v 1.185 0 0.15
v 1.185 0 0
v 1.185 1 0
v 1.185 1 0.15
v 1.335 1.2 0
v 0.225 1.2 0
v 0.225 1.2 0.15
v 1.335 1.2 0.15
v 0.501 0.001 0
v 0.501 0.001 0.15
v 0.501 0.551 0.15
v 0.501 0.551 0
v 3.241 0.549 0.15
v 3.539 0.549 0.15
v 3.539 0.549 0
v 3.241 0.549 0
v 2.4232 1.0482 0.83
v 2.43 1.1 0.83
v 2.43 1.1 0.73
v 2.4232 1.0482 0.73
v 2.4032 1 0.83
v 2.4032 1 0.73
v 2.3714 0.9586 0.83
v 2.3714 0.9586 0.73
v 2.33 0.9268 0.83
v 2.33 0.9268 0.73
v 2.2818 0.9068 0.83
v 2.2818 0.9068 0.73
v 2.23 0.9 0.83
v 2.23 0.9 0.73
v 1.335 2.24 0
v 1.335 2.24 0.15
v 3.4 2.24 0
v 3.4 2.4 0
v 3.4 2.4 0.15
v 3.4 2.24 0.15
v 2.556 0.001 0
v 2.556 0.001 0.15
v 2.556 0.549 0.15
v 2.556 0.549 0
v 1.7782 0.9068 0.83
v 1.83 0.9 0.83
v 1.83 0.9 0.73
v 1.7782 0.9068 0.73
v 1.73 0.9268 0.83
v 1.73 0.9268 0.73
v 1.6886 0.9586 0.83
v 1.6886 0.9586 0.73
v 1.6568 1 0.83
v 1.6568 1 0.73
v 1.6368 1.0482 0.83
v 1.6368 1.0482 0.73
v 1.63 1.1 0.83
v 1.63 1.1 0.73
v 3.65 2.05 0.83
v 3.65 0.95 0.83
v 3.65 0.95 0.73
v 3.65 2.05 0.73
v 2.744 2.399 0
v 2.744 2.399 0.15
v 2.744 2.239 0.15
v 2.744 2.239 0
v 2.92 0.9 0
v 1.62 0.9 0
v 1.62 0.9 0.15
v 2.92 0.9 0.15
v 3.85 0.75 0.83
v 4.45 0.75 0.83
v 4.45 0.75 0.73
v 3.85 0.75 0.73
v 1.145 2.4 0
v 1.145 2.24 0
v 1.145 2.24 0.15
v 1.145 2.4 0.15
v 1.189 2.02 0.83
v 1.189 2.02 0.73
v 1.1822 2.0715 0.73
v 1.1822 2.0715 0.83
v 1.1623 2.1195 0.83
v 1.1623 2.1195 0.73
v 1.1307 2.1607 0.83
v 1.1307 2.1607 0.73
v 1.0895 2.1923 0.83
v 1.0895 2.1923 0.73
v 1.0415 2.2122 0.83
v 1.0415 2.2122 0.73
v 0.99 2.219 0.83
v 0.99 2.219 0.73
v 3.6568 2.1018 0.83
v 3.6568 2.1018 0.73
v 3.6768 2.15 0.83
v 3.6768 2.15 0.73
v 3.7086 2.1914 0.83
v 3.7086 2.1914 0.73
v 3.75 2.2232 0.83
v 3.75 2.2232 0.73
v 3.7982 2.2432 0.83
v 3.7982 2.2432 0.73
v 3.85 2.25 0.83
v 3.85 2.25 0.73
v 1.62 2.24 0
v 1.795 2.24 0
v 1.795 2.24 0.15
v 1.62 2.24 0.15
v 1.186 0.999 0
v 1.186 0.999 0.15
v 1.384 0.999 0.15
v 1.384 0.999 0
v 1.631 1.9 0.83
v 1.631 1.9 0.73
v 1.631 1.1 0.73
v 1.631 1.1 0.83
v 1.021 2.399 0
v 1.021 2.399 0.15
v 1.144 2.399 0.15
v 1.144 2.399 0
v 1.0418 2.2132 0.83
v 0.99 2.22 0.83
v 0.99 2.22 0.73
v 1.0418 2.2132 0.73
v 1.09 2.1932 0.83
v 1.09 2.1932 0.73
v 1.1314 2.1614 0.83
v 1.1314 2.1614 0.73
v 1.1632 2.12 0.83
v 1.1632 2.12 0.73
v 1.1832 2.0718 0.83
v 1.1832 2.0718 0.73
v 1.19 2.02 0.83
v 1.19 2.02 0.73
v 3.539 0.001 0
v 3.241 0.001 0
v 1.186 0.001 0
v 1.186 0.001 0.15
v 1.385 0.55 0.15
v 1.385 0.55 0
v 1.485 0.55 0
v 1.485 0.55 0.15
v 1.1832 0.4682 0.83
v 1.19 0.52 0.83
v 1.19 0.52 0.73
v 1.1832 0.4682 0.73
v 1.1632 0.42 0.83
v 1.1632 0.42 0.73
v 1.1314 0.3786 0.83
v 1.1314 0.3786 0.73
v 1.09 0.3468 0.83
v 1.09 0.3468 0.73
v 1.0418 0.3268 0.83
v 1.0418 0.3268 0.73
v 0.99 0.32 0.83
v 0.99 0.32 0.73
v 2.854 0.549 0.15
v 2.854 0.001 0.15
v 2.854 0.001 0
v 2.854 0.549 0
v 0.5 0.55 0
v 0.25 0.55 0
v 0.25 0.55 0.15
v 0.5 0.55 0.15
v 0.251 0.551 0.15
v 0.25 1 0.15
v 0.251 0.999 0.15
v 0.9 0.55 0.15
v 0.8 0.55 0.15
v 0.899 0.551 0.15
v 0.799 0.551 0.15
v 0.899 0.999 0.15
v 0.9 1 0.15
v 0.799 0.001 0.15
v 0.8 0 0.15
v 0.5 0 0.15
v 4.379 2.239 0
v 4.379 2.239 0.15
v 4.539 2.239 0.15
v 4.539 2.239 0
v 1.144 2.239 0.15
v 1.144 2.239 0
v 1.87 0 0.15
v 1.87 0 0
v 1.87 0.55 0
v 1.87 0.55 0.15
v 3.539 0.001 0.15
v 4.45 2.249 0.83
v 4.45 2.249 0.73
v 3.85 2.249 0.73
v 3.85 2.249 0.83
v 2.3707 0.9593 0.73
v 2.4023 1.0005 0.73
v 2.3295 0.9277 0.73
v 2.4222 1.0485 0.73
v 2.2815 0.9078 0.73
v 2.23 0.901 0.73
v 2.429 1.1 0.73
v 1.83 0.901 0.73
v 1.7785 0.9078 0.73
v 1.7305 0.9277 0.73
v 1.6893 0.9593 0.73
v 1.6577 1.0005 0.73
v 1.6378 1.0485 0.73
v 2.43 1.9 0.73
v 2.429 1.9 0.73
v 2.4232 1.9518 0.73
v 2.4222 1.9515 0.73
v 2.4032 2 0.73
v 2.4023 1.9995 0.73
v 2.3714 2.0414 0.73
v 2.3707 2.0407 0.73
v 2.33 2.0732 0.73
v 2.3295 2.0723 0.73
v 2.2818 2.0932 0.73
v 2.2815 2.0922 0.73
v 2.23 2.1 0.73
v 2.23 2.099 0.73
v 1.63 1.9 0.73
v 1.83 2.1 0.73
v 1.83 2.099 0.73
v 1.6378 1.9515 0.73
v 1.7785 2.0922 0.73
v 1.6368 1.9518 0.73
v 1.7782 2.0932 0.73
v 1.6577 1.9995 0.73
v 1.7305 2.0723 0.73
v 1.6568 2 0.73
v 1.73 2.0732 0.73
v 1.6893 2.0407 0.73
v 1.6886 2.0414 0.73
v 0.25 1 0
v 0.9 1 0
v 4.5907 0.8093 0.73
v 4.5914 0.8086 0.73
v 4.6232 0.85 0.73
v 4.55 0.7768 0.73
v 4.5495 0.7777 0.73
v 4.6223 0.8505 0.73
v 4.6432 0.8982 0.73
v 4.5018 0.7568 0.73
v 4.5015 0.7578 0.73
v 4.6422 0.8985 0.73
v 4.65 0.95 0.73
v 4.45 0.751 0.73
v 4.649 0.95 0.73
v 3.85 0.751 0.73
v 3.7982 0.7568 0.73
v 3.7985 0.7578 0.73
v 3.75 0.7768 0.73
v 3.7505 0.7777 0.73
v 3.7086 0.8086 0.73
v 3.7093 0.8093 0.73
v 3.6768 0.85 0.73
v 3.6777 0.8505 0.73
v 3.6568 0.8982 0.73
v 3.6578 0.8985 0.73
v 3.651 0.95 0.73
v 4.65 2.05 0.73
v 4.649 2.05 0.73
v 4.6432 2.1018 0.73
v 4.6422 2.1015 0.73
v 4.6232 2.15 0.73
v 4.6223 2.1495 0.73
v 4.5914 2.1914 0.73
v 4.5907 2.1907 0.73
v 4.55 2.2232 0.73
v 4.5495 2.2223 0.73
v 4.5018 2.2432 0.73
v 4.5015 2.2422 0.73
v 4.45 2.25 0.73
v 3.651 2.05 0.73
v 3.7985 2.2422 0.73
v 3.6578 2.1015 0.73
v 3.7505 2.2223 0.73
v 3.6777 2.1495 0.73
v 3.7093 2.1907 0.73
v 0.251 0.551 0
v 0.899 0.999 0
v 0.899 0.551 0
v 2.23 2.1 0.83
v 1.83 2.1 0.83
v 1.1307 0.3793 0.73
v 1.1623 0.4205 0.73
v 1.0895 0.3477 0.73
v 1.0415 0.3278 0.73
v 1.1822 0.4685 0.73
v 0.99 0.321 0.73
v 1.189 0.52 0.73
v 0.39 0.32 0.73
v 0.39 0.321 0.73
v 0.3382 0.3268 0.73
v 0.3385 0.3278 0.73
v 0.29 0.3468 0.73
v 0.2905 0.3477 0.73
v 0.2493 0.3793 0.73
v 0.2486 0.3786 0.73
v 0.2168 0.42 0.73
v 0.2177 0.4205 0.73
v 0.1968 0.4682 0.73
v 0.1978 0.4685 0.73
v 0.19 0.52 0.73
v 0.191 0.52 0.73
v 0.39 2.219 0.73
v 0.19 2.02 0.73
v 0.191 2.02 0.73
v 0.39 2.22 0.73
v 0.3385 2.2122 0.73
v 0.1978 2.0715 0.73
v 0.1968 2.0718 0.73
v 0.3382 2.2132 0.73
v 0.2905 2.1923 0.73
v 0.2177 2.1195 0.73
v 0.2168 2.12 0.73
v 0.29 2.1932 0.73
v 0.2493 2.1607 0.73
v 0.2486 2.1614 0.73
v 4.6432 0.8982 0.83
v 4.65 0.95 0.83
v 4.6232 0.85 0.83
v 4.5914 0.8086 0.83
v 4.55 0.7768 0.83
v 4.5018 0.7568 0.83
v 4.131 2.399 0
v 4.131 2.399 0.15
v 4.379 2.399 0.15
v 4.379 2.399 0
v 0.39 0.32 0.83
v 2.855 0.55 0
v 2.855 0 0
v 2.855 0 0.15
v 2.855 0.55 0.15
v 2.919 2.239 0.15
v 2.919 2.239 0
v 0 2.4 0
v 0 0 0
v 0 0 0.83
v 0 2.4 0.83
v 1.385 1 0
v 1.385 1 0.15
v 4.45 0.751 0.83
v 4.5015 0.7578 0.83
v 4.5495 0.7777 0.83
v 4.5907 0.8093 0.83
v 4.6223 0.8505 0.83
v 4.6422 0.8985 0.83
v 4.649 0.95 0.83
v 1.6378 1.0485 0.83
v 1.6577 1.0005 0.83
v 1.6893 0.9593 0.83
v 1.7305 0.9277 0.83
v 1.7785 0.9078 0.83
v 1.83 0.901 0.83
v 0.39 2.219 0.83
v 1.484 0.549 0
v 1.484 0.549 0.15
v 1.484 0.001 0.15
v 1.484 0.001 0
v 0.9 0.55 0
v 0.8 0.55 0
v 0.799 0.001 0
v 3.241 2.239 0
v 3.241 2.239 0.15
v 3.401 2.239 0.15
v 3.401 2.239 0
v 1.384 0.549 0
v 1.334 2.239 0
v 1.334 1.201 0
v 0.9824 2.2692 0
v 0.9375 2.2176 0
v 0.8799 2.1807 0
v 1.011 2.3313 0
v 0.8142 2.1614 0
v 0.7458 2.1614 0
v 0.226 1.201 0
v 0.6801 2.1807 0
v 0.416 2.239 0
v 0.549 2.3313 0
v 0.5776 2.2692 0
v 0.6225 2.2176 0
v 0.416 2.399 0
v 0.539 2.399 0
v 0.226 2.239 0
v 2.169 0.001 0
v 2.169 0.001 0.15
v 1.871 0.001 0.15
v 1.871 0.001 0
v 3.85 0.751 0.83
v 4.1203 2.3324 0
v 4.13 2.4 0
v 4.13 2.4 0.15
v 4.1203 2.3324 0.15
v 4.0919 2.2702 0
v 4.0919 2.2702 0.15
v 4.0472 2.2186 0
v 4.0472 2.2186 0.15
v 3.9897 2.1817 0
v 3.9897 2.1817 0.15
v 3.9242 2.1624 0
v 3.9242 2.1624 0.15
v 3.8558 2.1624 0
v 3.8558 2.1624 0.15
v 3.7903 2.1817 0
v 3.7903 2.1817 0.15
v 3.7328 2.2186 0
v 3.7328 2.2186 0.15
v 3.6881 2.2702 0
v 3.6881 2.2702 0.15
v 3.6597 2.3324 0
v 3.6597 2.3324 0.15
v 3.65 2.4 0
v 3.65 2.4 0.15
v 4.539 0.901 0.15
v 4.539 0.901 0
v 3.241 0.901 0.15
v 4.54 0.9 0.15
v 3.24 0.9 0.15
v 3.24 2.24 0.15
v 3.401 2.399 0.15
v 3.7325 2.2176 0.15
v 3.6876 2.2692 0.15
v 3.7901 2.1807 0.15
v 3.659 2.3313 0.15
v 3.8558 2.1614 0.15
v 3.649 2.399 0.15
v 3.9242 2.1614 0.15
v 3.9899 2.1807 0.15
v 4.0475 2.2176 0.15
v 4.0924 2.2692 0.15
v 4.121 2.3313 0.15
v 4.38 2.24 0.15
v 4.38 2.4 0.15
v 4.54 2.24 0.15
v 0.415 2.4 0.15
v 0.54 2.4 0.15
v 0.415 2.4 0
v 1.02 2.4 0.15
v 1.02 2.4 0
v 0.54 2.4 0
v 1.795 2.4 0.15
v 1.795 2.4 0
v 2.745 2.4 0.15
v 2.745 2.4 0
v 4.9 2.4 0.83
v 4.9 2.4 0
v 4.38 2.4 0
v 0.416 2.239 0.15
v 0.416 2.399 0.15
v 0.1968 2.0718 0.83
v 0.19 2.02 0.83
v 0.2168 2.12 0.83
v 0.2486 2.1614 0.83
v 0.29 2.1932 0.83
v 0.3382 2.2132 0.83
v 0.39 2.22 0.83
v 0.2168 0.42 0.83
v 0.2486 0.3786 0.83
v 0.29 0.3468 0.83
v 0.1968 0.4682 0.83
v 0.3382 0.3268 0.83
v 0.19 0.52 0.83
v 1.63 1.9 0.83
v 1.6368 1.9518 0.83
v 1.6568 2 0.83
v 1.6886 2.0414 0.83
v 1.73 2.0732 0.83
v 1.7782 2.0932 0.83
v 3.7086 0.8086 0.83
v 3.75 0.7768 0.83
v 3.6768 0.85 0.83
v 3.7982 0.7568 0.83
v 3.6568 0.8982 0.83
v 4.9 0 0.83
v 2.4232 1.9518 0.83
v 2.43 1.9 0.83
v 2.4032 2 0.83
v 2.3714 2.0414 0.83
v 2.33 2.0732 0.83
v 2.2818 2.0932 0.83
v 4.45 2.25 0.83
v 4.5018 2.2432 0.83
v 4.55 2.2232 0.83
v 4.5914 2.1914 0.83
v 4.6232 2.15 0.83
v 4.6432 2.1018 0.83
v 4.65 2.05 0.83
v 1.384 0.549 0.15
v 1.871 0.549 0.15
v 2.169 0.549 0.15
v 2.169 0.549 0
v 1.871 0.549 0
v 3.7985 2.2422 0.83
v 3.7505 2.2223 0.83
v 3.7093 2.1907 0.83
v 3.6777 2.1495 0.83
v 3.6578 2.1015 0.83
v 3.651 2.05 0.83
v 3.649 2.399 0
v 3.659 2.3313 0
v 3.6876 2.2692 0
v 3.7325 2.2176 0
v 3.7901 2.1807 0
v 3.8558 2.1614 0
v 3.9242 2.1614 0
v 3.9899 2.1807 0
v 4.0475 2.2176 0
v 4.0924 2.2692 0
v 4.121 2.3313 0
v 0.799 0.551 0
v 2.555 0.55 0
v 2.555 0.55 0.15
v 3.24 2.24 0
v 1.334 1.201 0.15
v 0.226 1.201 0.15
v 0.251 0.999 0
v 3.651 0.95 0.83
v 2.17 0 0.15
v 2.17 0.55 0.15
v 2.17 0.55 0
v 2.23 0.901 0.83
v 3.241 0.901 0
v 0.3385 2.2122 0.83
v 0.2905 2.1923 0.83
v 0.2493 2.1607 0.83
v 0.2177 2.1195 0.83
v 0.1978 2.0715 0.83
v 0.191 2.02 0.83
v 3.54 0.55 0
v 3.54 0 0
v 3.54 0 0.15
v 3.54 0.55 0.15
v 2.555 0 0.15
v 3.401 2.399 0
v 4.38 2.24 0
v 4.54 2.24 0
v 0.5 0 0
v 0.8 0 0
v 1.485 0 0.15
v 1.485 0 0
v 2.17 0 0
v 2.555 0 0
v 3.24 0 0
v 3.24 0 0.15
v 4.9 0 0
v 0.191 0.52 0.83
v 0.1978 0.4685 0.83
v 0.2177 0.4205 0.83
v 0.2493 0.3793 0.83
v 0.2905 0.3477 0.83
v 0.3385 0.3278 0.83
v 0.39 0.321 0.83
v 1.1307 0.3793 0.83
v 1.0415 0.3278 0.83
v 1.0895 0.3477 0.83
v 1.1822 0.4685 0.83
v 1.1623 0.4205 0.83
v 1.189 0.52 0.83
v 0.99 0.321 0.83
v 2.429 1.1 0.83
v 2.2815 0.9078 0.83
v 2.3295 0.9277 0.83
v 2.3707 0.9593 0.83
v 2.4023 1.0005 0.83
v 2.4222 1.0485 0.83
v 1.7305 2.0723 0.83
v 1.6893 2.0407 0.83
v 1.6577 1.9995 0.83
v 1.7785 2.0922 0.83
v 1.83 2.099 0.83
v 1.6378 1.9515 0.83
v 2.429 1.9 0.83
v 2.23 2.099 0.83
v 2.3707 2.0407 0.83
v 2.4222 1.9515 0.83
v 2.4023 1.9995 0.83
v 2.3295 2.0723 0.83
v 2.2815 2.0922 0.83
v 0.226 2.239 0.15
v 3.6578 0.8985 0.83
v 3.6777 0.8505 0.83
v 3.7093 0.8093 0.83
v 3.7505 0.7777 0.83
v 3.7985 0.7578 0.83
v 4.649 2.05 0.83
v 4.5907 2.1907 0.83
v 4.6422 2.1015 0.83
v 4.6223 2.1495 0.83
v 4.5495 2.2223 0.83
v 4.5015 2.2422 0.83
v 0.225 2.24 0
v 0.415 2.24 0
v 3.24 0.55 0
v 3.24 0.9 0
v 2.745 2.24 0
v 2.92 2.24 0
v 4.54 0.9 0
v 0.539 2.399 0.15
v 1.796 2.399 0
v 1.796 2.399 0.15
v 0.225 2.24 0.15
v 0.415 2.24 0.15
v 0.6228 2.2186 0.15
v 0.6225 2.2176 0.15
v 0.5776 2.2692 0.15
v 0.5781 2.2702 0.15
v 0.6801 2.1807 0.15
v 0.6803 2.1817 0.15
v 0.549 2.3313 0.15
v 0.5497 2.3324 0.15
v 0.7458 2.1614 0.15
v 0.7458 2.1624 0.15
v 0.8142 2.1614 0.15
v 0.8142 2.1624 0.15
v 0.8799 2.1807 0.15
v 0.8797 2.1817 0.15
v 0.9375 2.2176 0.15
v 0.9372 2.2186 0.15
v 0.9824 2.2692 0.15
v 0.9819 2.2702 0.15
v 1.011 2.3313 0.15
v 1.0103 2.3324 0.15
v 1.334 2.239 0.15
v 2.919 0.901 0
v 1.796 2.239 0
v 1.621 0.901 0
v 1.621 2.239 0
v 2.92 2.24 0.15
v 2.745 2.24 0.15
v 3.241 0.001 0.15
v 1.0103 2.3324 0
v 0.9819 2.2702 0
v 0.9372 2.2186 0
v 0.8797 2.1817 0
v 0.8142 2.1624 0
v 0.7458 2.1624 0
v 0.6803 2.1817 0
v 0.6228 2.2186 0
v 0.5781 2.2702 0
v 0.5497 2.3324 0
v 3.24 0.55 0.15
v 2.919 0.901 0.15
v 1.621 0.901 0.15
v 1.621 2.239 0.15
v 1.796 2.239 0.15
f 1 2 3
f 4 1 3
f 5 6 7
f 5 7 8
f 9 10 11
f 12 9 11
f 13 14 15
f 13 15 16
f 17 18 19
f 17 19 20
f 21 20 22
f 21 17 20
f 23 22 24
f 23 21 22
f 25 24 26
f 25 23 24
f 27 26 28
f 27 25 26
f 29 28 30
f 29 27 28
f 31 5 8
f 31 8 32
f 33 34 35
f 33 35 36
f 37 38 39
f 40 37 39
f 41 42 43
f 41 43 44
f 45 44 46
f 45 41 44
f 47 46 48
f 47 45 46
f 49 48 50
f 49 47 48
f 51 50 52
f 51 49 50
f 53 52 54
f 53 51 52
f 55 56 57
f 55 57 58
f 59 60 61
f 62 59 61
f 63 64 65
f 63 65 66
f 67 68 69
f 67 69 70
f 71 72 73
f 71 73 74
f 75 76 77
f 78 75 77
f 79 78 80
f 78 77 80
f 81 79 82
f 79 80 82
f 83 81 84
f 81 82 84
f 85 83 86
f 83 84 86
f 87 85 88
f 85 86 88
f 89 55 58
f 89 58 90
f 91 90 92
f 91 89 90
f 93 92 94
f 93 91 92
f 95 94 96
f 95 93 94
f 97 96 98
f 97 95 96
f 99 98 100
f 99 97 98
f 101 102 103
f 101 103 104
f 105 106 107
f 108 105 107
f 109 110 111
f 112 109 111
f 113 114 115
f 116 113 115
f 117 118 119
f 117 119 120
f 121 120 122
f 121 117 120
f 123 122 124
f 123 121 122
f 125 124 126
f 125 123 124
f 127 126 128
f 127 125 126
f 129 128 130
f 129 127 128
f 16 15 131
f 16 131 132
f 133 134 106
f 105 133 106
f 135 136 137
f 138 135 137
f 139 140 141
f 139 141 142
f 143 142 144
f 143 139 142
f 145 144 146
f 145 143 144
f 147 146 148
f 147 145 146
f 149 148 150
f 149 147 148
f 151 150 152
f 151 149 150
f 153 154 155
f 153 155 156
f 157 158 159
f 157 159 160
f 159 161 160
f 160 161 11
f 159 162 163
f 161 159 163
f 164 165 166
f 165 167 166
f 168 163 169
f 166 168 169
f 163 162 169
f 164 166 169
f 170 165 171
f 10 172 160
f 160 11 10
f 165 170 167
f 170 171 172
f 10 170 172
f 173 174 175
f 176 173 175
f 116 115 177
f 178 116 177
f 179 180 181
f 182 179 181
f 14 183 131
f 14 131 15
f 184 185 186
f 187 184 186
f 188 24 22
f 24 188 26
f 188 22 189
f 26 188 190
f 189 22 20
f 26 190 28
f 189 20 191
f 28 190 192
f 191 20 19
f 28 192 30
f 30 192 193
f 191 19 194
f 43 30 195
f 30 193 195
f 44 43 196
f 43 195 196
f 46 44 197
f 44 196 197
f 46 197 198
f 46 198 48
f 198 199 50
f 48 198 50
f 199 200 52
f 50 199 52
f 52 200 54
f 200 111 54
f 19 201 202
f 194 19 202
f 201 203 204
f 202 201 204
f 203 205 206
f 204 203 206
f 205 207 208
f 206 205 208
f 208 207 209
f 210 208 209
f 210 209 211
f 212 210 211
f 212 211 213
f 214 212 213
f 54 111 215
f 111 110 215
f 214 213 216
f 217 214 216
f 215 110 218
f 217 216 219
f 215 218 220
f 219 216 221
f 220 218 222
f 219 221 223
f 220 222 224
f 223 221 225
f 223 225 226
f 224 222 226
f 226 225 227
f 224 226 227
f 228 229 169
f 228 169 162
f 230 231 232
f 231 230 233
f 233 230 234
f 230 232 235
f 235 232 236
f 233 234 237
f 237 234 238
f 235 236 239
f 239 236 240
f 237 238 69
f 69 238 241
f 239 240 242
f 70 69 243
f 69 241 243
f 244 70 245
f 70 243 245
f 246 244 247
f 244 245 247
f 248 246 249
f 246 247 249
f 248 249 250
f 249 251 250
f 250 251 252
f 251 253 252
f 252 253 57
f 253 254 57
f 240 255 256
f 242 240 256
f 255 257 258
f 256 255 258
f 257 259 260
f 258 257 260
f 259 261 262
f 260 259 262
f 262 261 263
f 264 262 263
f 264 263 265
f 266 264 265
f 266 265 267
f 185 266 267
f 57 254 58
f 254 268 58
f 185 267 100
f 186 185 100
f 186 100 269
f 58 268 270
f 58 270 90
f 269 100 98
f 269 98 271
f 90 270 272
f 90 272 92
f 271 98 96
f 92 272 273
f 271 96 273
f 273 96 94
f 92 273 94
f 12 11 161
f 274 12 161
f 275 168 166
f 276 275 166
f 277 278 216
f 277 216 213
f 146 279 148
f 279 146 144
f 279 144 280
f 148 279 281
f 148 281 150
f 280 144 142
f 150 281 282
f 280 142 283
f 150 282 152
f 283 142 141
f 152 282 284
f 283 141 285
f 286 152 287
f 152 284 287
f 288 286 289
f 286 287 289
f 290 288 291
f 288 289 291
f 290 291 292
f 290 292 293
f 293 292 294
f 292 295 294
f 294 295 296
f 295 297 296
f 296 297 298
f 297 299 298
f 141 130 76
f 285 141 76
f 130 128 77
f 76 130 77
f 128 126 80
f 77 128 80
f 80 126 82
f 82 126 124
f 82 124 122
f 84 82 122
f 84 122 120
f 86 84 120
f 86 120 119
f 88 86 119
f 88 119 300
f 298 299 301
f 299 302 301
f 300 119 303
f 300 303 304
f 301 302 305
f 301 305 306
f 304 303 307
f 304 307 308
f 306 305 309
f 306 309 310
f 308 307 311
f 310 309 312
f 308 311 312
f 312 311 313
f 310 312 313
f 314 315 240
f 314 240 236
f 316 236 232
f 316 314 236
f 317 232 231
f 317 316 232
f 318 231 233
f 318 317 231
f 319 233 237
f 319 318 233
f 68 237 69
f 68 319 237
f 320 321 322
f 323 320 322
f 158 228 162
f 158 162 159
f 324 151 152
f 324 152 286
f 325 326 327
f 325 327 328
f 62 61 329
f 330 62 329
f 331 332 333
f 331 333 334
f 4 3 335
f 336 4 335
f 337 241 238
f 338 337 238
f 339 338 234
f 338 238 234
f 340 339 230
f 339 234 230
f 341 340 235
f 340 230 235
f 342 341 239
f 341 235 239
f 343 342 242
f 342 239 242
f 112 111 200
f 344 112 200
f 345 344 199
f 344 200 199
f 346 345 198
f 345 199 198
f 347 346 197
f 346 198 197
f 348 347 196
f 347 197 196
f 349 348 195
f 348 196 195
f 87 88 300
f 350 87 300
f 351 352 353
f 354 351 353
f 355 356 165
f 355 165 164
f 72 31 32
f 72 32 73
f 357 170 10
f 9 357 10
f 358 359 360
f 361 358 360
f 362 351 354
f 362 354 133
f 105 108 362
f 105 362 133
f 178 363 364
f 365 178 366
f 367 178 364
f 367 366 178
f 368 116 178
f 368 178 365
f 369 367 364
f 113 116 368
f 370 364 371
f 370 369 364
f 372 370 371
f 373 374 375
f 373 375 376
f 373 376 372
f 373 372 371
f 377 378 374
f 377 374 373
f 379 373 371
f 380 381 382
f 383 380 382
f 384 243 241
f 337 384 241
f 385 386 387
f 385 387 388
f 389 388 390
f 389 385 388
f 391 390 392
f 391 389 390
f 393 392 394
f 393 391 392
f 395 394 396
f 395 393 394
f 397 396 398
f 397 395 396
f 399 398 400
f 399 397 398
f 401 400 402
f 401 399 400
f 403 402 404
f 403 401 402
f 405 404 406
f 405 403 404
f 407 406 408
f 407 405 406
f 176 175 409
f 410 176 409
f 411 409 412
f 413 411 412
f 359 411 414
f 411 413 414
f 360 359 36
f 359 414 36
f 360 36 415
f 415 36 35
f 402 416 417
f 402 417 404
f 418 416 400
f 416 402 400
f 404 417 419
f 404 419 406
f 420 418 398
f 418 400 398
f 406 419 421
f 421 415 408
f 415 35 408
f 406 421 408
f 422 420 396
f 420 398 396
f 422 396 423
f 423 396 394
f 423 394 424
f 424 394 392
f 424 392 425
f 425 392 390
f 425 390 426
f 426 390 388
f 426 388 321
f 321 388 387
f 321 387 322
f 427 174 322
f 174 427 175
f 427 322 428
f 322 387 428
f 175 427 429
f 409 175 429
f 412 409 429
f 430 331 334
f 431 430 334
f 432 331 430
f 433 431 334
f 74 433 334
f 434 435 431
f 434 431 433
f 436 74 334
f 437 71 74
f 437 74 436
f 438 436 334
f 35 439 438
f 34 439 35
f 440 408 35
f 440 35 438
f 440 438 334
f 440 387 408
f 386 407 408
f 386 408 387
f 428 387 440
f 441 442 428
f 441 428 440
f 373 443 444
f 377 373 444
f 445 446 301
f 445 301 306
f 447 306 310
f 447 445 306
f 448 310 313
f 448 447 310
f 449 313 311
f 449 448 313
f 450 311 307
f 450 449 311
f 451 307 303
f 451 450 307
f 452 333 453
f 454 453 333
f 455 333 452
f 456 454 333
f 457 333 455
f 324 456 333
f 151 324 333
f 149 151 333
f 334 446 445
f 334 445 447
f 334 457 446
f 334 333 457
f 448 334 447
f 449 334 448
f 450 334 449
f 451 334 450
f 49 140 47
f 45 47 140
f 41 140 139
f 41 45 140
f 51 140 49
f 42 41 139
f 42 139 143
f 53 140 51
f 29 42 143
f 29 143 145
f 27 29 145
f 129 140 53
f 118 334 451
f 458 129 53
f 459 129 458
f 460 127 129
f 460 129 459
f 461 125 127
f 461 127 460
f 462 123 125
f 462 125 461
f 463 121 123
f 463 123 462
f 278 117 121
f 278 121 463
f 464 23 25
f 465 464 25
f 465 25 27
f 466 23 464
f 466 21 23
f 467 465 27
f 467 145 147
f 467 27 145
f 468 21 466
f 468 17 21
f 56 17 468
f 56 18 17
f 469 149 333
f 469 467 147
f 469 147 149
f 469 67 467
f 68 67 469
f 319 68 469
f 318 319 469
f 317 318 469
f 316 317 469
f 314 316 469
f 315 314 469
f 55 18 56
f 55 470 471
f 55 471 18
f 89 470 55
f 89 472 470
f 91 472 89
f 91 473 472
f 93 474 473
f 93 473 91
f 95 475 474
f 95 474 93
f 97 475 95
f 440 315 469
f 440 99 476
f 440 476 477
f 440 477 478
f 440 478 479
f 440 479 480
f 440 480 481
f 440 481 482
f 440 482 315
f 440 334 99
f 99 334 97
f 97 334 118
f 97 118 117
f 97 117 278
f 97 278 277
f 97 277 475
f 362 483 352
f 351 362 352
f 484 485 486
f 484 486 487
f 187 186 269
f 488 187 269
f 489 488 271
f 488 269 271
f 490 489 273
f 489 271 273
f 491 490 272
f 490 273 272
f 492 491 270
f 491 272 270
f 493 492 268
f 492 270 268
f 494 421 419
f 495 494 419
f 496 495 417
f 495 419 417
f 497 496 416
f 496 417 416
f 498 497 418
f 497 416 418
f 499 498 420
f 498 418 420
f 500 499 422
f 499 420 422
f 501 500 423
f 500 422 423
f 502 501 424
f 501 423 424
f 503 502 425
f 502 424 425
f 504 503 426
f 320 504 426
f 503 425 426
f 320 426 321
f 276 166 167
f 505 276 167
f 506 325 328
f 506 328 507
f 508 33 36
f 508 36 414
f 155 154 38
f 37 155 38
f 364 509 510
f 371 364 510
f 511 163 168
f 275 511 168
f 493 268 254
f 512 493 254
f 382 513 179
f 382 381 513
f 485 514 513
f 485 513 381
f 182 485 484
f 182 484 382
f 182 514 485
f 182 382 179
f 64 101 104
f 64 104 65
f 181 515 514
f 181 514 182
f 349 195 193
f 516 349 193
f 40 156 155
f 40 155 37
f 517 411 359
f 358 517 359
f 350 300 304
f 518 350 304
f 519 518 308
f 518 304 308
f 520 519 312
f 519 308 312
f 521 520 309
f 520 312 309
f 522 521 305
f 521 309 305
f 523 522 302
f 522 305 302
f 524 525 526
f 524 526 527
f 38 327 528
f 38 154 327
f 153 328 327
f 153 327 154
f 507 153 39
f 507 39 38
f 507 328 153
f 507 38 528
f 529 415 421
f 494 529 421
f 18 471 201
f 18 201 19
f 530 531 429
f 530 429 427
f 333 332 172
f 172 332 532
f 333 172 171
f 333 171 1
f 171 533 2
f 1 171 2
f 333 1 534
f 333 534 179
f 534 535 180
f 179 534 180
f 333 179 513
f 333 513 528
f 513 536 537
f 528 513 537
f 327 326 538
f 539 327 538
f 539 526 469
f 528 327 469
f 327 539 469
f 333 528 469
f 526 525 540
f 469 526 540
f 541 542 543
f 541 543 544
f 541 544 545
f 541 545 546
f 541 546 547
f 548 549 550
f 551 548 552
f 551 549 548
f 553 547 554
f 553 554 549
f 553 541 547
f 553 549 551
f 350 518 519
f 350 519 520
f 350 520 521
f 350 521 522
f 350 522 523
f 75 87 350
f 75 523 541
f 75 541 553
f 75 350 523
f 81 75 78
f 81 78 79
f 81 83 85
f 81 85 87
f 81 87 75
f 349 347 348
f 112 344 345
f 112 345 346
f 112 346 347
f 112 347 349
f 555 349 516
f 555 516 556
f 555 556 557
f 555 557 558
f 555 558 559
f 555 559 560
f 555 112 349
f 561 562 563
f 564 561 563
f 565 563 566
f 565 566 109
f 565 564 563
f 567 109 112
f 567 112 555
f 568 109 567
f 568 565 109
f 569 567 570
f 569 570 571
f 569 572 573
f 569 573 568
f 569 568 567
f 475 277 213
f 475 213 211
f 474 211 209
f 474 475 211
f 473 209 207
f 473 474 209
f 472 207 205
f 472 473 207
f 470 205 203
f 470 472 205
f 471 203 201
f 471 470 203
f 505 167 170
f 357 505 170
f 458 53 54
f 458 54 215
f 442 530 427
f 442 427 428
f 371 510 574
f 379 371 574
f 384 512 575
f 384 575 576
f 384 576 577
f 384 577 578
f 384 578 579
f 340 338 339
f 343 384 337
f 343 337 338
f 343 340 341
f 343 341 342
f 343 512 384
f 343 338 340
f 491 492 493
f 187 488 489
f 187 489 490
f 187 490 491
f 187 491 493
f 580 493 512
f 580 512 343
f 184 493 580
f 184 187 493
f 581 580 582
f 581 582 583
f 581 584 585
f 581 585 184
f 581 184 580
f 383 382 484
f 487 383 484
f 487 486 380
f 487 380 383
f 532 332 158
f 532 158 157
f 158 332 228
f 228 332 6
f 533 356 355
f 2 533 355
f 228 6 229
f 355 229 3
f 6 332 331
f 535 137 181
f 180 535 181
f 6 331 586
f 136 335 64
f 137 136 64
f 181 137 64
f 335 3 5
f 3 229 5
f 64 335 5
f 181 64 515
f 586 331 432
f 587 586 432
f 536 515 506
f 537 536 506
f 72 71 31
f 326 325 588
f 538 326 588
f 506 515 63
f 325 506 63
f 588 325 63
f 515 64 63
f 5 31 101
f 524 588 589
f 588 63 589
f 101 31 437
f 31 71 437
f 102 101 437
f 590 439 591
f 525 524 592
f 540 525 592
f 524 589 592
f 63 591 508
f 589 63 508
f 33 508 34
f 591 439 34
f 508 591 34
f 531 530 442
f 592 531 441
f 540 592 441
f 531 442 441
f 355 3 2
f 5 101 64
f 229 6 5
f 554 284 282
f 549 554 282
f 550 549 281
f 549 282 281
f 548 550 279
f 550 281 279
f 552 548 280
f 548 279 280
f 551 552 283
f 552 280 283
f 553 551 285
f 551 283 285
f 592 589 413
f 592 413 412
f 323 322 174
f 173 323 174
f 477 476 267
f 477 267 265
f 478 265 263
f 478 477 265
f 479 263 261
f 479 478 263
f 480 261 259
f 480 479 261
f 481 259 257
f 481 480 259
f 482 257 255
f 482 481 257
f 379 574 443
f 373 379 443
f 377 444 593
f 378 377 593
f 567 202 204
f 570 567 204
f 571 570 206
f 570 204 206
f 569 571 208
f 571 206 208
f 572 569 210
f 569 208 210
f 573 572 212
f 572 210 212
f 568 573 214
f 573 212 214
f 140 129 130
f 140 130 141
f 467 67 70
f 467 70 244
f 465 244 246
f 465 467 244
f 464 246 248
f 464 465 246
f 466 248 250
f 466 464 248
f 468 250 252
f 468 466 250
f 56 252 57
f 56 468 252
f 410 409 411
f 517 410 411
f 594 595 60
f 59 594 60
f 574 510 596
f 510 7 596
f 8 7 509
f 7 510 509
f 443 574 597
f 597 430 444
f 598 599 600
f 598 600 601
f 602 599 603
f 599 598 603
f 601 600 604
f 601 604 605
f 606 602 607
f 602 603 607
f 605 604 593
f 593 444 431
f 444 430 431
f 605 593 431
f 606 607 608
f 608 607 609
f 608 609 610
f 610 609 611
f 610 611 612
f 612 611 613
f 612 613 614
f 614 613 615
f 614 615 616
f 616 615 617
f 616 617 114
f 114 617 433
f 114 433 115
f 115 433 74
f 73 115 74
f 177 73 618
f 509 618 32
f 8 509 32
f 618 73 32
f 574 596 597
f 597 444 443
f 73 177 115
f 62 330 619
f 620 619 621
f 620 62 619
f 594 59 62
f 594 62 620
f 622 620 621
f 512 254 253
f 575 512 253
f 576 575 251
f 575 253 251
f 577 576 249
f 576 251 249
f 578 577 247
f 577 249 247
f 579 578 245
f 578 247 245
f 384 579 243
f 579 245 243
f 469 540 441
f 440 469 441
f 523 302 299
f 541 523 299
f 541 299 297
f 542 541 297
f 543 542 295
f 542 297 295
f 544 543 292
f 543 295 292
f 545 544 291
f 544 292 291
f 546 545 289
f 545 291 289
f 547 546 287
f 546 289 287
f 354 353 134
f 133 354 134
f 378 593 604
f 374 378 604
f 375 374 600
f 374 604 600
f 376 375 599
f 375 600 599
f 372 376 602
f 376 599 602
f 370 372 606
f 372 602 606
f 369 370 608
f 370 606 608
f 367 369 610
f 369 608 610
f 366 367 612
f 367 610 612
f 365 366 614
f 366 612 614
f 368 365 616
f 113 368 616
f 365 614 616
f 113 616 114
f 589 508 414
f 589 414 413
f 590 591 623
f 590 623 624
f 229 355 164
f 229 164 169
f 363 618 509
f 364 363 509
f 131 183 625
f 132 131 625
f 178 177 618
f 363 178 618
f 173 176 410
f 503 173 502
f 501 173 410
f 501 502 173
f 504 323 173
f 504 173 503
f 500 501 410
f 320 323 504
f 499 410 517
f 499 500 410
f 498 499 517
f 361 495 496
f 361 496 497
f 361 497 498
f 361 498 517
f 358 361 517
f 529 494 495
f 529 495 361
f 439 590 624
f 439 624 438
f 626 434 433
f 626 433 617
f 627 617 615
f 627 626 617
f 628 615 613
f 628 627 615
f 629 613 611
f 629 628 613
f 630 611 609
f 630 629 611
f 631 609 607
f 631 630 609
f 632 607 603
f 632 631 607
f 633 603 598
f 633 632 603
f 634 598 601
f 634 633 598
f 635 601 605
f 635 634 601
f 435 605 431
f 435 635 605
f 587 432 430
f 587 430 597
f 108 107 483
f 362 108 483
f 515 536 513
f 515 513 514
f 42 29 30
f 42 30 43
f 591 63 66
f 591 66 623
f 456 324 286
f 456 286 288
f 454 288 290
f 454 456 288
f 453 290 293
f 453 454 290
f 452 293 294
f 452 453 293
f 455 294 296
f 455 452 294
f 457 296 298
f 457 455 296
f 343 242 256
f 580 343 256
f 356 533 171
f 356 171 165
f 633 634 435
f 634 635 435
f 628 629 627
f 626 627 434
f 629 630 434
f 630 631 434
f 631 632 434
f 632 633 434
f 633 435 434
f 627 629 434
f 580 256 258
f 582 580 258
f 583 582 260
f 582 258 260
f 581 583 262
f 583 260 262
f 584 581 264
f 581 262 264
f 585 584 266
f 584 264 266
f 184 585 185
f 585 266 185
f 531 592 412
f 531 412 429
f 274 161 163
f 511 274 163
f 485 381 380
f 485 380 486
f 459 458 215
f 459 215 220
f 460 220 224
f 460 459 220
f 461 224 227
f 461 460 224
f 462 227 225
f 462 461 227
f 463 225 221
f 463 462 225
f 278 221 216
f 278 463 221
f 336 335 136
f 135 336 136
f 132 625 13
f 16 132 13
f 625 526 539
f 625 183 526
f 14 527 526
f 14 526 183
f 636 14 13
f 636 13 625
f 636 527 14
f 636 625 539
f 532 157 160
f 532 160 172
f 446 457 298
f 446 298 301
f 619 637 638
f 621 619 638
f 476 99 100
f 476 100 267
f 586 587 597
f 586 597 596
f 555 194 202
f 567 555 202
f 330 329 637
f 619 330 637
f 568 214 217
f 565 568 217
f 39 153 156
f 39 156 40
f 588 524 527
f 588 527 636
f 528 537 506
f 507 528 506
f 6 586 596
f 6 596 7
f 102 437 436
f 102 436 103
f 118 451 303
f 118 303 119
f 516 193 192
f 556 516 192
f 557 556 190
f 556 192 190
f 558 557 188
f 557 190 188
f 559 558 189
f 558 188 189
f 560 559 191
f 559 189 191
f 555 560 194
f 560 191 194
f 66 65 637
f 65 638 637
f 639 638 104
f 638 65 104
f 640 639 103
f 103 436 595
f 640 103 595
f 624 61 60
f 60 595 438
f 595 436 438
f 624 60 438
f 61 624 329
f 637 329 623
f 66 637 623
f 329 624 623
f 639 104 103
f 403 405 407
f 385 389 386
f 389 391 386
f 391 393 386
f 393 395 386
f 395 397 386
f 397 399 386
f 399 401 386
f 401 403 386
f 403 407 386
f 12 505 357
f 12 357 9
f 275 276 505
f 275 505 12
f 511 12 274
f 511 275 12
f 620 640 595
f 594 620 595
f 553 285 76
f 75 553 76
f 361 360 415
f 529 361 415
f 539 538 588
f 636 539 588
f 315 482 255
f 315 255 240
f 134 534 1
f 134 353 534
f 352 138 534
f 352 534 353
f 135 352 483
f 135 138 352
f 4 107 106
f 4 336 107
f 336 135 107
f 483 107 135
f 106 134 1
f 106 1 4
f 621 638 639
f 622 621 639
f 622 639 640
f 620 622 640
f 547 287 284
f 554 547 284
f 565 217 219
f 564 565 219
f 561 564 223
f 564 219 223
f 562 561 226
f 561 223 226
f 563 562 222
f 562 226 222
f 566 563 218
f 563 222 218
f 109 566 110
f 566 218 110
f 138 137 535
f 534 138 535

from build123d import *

# Parameters (mm, degrees)
SKETCH_1_W          = 4.9
SKETCH_1_H          = 2.4
EXTRUDE_320_DEPTH   = 0.83
CUT_EXTRUDE_1_DEPTH = 0.1
SKETCH_3_W          = 0.3
SKETCH_3_H          = 0.55
CUT_EXTRUDE_2_DEPTH = 0.15
EXTRUDE_1_DEPTH     = 0.15
SKETCH_5_W          = 0.298
SKETCH_5_H          = 0.548
EXTRUDE_2_DEPTH     = 0.15
EXTRUDE_3_DEPTH     = 0.1


with BuildPart() as part:
    # Эскиз1 → Extrude 320 (new body)
    with BuildSketch(Plane.XY):
        with Locations((2.45, 1.2)):
            Rectangle(SKETCH_1_W, SKETCH_1_H)
    extrude(amount=EXTRUDE_320_DEPTH)

    # Эскиз2 → Вырез-Вытянуть1 (cut)
    with BuildSketch(Plane.XY.offset(0.83)):
        with BuildLine():
            Line((3.85, 2.25), (4.45, 2.25))
            ThreePointArc((4.45, 2.25), (4.591421356, 2.191421356), (4.65, 2.05))
            Line((4.65, 2.05), (4.65, 0.95))
            ThreePointArc((4.65, 0.95), (4.591421356, 0.808578644), (4.45, 0.75))
            Line((4.45, 0.75), (3.85, 0.75))
            ThreePointArc((3.85, 0.75), (3.708578644, 0.808578644), (3.65, 0.95))
            Line((3.65, 0.95), (3.65, 2.05))
            ThreePointArc((3.65, 2.05), (3.708578644, 2.191421356), (3.85, 2.25))
        make_face()
        with BuildLine():
            Line((1.83, 2.1), (2.23, 2.1))
            ThreePointArc((2.23, 2.1), (2.371421356, 2.041421356), (2.43, 1.9))
            Line((2.43, 1.9), (2.43, 1.1))
            ThreePointArc((2.43, 1.1), (2.371421356, 0.958578644), (2.23, 0.9))
            Line((2.23, 0.9), (1.83, 0.9))
            ThreePointArc((1.83, 0.9), (1.688578644, 0.958578644), (1.63, 1.1))
            Line((1.63, 1.1), (1.63, 1.9))
            ThreePointArc((1.63, 1.9), (1.688578644, 2.041421356), (1.83, 2.1))
        make_face()
        with BuildLine():
            Line((0.39, 2.22), (0.99, 2.22))
            ThreePointArc((0.99, 2.22), (1.131421356, 2.161421356), (1.19, 2.02))
            Line((1.19, 2.02), (1.19, 0.52))
            ThreePointArc((1.19, 0.52), (1.131421356, 0.378578644), (0.99, 0.32))
            Line((0.99, 0.32), (0.39, 0.32))
            ThreePointArc((0.39, 0.32), (0.248578644, 0.378578644), (0.19, 0.52))
            Line((0.19, 0.52), (0.19, 2.02))
            ThreePointArc((0.19, 2.02), (0.248578644, 2.161421356), (0.39, 2.22))
        make_face()
    extrude(amount=-CUT_EXTRUDE_1_DEPTH, mode=Mode.SUBTRACT)

    # Эскиз3 → Вырез-Вытянуть2 (cut)
    with BuildSketch(Plane(origin=(0, 0, 0), x_dir=(-1, 0, 0), z_dir=(0, 0, -1))):
        with BuildLine():
            Line((-0.225, 1.2), (-1.335, 1.2))
            Line((-1.335, 1.2), (-1.335, 2.24))
            Line((-1.335, 2.24), (-1.145, 2.24))
            Line((-1.145, 2.24), (-1.145, 2.4))
            Line((-1.145, 2.4), (-1.02, 2.4))
            ThreePointArc((-1.02, 2.4), (-0.78, 2.16), (-0.54, 2.4))
            Line((-0.54, 2.4), (-0.415, 2.4))
            Line((-0.415, 2.4), (-0.415, 2.24))
            Line((-0.415, 2.24), (-0.225, 2.24))
            Line((-0.225, 2.24), (-0.225, 1.2))
        make_face()
        Polygon((-1.62, 0.9), (-2.92, 0.9), (-2.92, 2.24), (-2.745, 2.24), (-2.745, 2.4), (-1.795, 2.4), (-1.795, 2.24), (-1.62, 2.24), align=None)
        with BuildLine():
            Line((-3.24, 0.9), (-4.54, 0.9))
            Line((-4.54, 0.9), (-4.54, 2.24))
            Line((-4.54, 2.24), (-4.38, 2.24))
            Line((-4.38, 2.24), (-4.38, 2.4))
            Line((-4.38, 2.4), (-4.13, 2.4))
            ThreePointArc((-4.13, 2.4), (-3.89, 2.16), (-3.65, 2.4))
            Line((-3.65, 2.4), (-3.4, 2.4))
            Line((-3.4, 2.4), (-3.4, 2.24))
            Line((-3.4, 2.24), (-3.24, 2.24))
            Line((-3.24, 2.24), (-3.24, 0.9))
        make_face()
        Polygon((-0.5, 0), (-0.8, 0), (-0.8, 0.55), (-0.9, 0.55), (-0.9, 1), (-0.25, 1), (-0.25, 0.55), (-0.5, 0.55), align=None)
        Polygon((-1.485, 0), (-1.185, 0), (-1.185, 1), (-1.385, 1), (-1.385, 0.55), (-1.485, 0.55), align=None)
        with Locations((-2.02, 0.275)):
            Rectangle(SKETCH_3_W, SKETCH_3_H)
        with Locations((-2.705, 0.275)):
            Rectangle(SKETCH_3_W, SKETCH_3_H)
        with Locations((-3.39, 0.275)):
            Rectangle(SKETCH_3_W, SKETCH_3_H)
    extrude(amount=-CUT_EXTRUDE_2_DEPTH, mode=Mode.SUBTRACT)

    # Эскиз4 → Бобышка-Вытянуть1 (add)
    with BuildSketch(Plane(origin=(0, 0, 0.15), x_dir=(-1, 0, 0), z_dir=(0, 0, -1))):
        Polygon((-0.501, 0.001), (-0.501, 0.551), (-0.251, 0.551), (-0.251, 0.999), (-0.899, 0.999), (-0.899, 0.551), (-0.799, 0.551), (-0.799, 0.001), align=None)
    extrude(amount=EXTRUDE_1_DEPTH)

    # Эскиз5 → Бобышка-Вытянуть2 (add)
    with BuildSketch(Plane(origin=(0, 0, 0.15), x_dir=(-1, 0, 0), z_dir=(0, 0, -1))):
        Polygon((-1.484, 0.549), (-1.484, 0.001), (-1.186, 0.001), (-1.186, 0.999), (-1.384, 0.999), (-1.384, 0.549), align=None)
        with Locations((-2.02, 0.275)):
            Rectangle(SKETCH_5_W, SKETCH_5_H)
        with Locations((-2.705, 0.275)):
            Rectangle(SKETCH_5_W, SKETCH_5_H)
        with Locations((-3.39, 0.275)):
            Rectangle(SKETCH_5_W, SKETCH_5_H)
        with BuildLine():
            Line((-3.241, 0.901), (-3.241, 2.239))
            Line((-3.241, 2.239), (-3.401, 2.239))
            Line((-3.401, 2.239), (-3.401, 2.399))
            Line((-3.401, 2.399), (-3.649002075, 2.399))
            ThreePointArc((-3.649002075, 2.399), (-3.89, 2.159), (-4.130997925, 2.399))
            Line((-4.130997925, 2.399), (-4.379, 2.399))
            Line((-4.379, 2.399), (-4.379, 2.239))
            Line((-4.379, 2.239), (-4.539, 2.239))
            Line((-4.539, 2.239), (-4.539, 0.901))
            Line((-4.539, 0.901), (-3.241, 0.901))
        make_face()
        Polygon((-1.621, 0.901), (-1.621, 2.239), (-1.796, 2.239), (-1.796, 2.399), (-2.744, 2.399), (-2.744, 2.239), (-2.919, 2.239), (-2.919, 0.901), align=None)
        with BuildLine():
            Line((-0.226, 1.201), (-0.226, 2.239))
            Line((-0.226, 2.239), (-0.416, 2.239))
            Line((-0.416, 2.239), (-0.416, 2.399))
            Line((-0.416, 2.399), (-0.539002075, 2.399))
            ThreePointArc((-0.539002075, 2.399), (-0.78, 2.159), (-1.020997925, 2.399))
            Line((-1.020997925, 2.399), (-1.144, 2.399))
            Line((-1.144, 2.399), (-1.144, 2.239))
            Line((-1.144, 2.239), (-1.334, 2.239))
            Line((-1.334, 2.239), (-1.334, 1.201))
            Line((-1.334, 1.201), (-0.226, 1.201))
        make_face()
    extrude(amount=EXTRUDE_2_DEPTH)

    # Эскиз6 → Бобышка-Вытянуть3 (add)
    with BuildSketch(Plane.XY.offset(0.73)):
        with BuildLine():
            Line((3.85, 0.751), (4.45, 0.751))
            ThreePointArc((4.45, 0.751), (4.590714249, 0.809285751), (4.649, 0.95))
            Line((4.649, 0.95), (4.649, 2.05))
            ThreePointArc((4.649, 2.05), (4.590714249, 2.190714249), (4.45, 2.249))
            Line((4.45, 2.249), (3.85, 2.249))
            ThreePointArc((3.85, 2.249), (3.709285751, 2.190714249), (3.651, 2.05))
            Line((3.651, 2.05), (3.651, 0.95))
            ThreePointArc((3.651, 0.95), (3.709285751, 0.809285751), (3.85, 0.751))
        make_face()
        with BuildLine():
            Line((1.631, 1.9), (1.631, 1.1))
            ThreePointArc((1.631, 1.1), (1.689285751, 0.959285751), (1.83, 0.901))
            Line((1.83, 0.901), (2.23, 0.901))
            ThreePointArc((2.23, 0.901), (2.370714249, 0.959285751), (2.429, 1.1))
            Line((2.429, 1.1), (2.429, 1.9))
            ThreePointArc((2.429, 1.9), (2.370714249, 2.040714249), (2.23, 2.099))
            Line((2.23, 2.099), (1.83, 2.099))
            ThreePointArc((1.83, 2.099), (1.689285751, 2.040714249), (1.631, 1.9))
        make_face()
        with BuildLine():
            Line((0.39, 0.321), (0.99, 0.321))
            ThreePointArc((0.99, 0.321), (1.130714249, 0.379285751), (1.189, 0.52))
            Line((1.189, 0.52), (1.189, 2.02))
            ThreePointArc((1.189, 2.02), (1.130714249, 2.160714249), (0.99, 2.219))
            Line((0.99, 2.219), (0.39, 2.219))
            ThreePointArc((0.39, 2.219), (0.249285751, 2.160714249), (0.191, 2.02))
            Line((0.191, 2.02), (0.191, 0.52))
            ThreePointArc((0.191, 0.52), (0.249285751, 0.379285751), (0.39, 0.321))
        make_face()
    extrude(amount=EXTRUDE_3_DEPTH)


solid = part.part
